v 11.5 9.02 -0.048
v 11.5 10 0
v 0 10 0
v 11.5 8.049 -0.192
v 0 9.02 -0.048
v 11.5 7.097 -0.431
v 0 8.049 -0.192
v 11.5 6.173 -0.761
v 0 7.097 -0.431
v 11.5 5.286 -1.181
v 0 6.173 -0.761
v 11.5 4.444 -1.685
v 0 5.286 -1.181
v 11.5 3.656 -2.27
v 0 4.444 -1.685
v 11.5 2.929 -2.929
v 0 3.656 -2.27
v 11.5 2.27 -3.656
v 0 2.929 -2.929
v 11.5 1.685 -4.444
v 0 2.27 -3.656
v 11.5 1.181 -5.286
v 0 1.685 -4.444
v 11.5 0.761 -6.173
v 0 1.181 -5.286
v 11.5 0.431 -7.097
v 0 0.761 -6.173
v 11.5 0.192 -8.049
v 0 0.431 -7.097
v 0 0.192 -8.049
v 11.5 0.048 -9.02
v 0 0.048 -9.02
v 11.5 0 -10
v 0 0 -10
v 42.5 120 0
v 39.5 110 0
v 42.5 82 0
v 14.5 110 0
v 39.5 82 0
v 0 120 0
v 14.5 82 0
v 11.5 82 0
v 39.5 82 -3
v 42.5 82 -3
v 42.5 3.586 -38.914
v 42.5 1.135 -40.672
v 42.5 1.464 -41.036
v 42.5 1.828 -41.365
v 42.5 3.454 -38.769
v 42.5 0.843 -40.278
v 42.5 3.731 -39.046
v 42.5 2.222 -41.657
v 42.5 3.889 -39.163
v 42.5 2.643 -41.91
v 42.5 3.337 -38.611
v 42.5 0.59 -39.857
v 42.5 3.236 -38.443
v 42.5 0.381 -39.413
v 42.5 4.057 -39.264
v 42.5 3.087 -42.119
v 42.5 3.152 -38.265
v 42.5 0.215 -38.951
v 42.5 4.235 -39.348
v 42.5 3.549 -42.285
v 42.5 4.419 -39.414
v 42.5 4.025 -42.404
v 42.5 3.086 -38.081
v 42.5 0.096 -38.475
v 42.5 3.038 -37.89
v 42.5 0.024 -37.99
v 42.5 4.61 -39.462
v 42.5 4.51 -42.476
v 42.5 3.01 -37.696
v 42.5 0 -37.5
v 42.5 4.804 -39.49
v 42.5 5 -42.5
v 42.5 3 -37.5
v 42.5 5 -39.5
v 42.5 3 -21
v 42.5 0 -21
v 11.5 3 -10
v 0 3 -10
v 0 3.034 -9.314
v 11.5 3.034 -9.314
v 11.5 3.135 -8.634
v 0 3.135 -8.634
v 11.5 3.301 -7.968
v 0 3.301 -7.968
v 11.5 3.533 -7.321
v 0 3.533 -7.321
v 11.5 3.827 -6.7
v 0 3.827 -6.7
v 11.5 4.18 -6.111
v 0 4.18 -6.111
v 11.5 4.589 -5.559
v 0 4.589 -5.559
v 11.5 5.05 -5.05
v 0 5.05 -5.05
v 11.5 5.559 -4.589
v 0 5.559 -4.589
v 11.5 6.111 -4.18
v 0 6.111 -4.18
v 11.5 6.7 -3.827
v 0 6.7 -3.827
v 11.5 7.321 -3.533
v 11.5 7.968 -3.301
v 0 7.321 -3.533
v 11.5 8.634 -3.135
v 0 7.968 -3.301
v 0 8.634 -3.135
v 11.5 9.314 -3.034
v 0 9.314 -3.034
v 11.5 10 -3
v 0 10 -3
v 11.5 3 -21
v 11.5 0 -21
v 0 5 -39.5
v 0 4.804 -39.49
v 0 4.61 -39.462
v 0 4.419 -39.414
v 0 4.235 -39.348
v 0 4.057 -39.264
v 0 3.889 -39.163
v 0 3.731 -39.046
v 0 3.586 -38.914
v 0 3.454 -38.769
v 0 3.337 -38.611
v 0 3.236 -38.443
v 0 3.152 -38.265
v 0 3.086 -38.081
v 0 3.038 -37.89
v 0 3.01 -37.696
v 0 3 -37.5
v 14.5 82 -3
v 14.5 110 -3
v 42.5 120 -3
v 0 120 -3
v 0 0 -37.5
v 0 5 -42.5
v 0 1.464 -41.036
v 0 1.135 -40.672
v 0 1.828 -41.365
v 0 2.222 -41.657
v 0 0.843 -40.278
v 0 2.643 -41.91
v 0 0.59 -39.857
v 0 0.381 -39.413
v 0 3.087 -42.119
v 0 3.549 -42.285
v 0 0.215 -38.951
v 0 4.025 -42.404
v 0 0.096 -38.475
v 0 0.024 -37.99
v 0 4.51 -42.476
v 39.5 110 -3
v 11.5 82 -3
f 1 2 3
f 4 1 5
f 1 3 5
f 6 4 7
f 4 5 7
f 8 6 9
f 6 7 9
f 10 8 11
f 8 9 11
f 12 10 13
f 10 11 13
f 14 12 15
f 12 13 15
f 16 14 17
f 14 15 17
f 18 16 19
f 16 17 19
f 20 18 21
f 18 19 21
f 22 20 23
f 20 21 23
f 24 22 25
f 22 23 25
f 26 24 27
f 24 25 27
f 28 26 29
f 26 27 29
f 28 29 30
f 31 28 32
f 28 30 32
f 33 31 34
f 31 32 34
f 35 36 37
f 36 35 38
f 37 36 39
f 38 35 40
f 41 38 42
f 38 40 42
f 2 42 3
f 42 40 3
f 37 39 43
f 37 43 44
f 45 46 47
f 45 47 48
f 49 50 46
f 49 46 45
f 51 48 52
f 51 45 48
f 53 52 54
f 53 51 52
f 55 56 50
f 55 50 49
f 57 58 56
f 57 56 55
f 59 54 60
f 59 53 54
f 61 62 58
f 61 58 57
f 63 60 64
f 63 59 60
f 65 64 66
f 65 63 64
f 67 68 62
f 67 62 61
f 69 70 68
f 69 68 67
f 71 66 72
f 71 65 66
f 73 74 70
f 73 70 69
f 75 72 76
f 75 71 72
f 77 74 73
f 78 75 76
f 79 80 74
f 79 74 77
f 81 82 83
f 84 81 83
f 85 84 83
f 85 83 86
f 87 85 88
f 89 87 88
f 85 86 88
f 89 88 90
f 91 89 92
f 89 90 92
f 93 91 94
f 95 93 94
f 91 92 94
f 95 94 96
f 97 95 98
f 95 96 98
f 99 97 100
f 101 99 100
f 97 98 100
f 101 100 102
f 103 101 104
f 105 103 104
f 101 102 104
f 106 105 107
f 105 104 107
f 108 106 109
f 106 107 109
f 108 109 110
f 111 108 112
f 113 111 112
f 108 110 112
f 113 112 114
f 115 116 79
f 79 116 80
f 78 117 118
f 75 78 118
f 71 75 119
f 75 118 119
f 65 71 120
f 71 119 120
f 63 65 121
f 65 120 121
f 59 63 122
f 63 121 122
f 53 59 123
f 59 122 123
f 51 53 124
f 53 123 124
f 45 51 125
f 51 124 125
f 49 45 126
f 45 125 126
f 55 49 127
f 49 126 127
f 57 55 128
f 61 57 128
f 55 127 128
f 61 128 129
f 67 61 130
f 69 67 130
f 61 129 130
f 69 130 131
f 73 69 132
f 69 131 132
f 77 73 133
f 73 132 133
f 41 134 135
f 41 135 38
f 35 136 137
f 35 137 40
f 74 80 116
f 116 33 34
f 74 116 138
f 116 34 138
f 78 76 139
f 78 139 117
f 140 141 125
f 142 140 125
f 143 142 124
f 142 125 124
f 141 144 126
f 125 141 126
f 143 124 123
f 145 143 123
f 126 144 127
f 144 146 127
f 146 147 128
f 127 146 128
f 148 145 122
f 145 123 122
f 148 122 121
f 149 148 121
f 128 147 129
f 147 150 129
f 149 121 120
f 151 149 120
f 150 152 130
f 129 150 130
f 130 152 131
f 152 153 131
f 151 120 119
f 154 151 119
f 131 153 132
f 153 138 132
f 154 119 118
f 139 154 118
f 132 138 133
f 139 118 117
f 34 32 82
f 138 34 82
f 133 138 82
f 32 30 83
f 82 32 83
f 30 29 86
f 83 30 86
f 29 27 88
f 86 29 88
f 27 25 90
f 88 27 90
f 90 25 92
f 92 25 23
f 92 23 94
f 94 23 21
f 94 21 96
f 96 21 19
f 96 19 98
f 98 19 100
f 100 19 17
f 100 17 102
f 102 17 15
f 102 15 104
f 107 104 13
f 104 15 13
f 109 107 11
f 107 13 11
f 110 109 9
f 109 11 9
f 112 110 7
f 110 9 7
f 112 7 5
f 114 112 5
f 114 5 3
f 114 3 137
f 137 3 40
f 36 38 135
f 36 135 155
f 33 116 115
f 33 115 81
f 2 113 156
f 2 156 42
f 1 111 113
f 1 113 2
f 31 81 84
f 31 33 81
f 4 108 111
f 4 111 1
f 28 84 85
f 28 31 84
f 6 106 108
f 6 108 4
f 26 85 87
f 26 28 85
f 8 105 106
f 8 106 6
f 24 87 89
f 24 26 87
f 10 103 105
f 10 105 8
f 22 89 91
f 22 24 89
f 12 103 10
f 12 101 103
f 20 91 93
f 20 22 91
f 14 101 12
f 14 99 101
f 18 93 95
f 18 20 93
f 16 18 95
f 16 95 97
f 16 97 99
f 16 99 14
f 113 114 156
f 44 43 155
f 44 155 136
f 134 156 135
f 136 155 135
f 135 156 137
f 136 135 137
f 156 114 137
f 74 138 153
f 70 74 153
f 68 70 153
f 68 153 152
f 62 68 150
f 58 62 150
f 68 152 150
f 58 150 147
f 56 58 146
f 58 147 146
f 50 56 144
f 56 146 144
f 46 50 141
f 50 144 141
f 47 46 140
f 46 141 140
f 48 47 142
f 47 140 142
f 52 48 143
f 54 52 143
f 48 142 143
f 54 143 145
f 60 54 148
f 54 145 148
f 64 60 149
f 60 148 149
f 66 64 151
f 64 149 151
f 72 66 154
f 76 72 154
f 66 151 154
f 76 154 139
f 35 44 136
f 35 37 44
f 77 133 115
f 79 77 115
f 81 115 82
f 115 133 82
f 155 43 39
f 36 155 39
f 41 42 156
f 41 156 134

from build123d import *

# Parameters (mm, degrees)
F1_DEPTH = 42.5
F2_W     = 25
F2_H     = 21
F3_DEPTH = 110
F4_W     = 3
F4_H     = 21
F5_DEPTH = 82
F6_W     = 3
F6_H     = 21
F7_DEPTH = 82


with BuildPart() as f1:
    # F0 (on Right) → F1 (new body)
    with BuildSketch(Plane.YZ):
        with BuildLine():
            Line((120, -3), (120, 0))
            Line((120, 0), (10, 0))
            ThreePointArc((10, 0), (2.928932, -2.928932), (0, -10))
            Line((0, -10), (0, -37.5))
            ThreePointArc((0, -37.5), (1.464466, -41.035534), (5, -42.5))
            Line((5, -42.5), (5, -39.5))
            ThreePointArc((5, -39.5), (3.585786, -38.914214), (3, -37.5))
            Line((3, -37.5), (3, -10))
            ThreePointArc((3, -10), (5.050253, -5.050253), (10, -3))
            Line((10, -3), (120, -3))
        make_face()
    extrude(amount=F1_DEPTH)

    # F2 (on face) → F3 (cut)
    with BuildSketch(Plane.XZ):
        with Locations((27, -10.5)):
            Rectangle(F2_W, F2_H)
    extrude(amount=-F3_DEPTH, mode=Mode.SUBTRACT)

    # F4 (on face) → F5 (cut)
    with BuildSketch(Plane.XZ):
        with Locations((13, -10.5)):
            Rectangle(F4_W, F4_H)
    extrude(amount=-F5_DEPTH, mode=Mode.SUBTRACT)

    # F6 (on face) → F7 (cut)
    with BuildSketch(Plane.XZ):
        with Locations((41, -10.5)):
            Rectangle(F6_W, F6_H)
    extrude(amount=-F7_DEPTH, mode=Mode.SUBTRACT)


solid = f1.part
